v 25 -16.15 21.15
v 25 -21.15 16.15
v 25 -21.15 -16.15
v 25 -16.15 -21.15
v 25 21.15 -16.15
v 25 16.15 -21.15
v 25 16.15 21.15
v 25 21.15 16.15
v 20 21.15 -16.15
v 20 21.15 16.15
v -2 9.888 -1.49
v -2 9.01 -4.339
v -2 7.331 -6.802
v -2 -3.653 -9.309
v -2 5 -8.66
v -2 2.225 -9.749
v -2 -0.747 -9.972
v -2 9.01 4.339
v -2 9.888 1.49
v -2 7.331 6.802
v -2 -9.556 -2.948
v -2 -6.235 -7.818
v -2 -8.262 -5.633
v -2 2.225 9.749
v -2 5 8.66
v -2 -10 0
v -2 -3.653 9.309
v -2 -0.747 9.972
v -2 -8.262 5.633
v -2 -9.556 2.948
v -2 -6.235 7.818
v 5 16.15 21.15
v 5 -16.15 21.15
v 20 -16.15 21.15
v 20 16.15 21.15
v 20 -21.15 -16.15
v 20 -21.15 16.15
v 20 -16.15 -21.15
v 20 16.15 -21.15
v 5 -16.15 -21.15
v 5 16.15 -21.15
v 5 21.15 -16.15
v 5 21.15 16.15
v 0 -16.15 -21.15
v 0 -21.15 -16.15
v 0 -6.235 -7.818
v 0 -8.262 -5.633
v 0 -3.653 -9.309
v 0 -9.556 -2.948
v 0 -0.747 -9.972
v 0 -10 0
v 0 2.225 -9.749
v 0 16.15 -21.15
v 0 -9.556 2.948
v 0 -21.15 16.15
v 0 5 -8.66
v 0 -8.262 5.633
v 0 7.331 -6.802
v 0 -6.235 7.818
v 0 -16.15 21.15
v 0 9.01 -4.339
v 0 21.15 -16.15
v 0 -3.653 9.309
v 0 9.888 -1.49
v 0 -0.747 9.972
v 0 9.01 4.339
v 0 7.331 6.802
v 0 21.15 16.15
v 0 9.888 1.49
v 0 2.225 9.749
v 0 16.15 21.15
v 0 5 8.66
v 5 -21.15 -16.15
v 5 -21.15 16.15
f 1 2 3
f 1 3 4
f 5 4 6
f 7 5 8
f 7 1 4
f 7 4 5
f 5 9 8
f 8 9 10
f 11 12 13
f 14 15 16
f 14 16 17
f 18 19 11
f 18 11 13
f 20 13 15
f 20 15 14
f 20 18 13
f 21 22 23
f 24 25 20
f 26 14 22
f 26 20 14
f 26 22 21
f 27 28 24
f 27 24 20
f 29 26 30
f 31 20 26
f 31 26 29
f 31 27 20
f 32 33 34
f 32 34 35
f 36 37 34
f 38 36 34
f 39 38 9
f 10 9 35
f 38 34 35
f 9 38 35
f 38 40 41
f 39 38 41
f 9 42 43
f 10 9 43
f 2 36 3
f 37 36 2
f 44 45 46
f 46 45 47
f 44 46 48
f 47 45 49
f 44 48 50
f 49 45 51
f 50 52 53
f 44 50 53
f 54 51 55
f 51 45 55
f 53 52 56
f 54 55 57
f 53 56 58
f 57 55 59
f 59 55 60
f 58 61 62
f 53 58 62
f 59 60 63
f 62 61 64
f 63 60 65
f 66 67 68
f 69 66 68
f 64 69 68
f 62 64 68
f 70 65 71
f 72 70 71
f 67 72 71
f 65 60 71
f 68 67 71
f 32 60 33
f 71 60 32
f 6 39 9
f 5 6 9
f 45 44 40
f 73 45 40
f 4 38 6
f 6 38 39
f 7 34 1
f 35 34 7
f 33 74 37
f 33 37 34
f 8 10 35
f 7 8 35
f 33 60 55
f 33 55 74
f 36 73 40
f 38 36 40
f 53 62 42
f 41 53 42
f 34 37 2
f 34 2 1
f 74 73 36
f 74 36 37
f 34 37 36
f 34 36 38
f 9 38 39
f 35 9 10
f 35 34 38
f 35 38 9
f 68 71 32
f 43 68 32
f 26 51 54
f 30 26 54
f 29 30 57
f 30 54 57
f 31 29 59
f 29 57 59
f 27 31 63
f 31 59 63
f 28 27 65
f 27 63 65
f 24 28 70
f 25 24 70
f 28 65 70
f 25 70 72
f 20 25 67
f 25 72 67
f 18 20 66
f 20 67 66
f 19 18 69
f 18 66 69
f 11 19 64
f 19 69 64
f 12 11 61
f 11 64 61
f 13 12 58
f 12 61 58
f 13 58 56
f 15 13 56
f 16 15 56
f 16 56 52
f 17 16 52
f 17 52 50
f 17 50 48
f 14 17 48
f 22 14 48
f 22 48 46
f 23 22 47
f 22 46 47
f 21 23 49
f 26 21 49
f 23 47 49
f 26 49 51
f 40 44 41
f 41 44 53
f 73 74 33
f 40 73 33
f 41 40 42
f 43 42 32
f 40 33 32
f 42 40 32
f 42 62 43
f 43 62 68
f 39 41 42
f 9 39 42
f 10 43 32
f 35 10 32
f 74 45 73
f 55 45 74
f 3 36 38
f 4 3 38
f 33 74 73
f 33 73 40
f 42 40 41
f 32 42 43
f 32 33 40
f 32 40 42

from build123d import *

# Parameters (mm, degrees)
F0_W     = 42.3
F0_H     = 42.3
F1_DEPTH = 5
F2_SIZE  = 5
F3_DEPTH = 15
F4_DEPTH = 5
F5_R     = 10
F6_DEPTH = 2


with BuildPart() as f1:
    # F0 (on Right) → F1 (new body)
    with BuildSketch(Plane.YZ):
        Rectangle(F0_W, F0_H)
    extrude(amount=F1_DEPTH)

    # F2
    f2_edges = [f1.edges().sort_by_distance(p)[0] for p in [
        (2.5, -21.15, 21.15),
        (2.5, -21.15, -21.15),
        (2.5, 21.15, -21.15),
        (2.5, 21.15, 21.15),
    ]]
    chamfer(f2_edges, length=F2_SIZE)


with BuildPart() as f3:
    # F3 (new): a face of the model
    f3_faces = [f1.part.faces().sort_by_distance(p)[0] for p in [
        (5, 0, 0),
    ]]
    extrude(f3_faces, amount=F3_DEPTH)


with BuildPart() as f4:
    # F4 (new): a face of the model
    f4_faces = [f3.part.faces().sort_by_distance(p)[0] for p in [
        (20, 0, 0),
    ]]
    extrude(f4_faces, amount=F4_DEPTH)


with BuildPart() as f1_1:
    add(f1.part)

    # F5 (on face) → F6 (join)
    with BuildSketch(Plane(origin=(0, 0, 0), x_dir=(0, -1, 0), z_dir=(-1, 0, 0))):
        Circle(F5_R)
    extrude(amount=F6_DEPTH)


solid = Compound([f3.part, f4.part, f1_1.part])
